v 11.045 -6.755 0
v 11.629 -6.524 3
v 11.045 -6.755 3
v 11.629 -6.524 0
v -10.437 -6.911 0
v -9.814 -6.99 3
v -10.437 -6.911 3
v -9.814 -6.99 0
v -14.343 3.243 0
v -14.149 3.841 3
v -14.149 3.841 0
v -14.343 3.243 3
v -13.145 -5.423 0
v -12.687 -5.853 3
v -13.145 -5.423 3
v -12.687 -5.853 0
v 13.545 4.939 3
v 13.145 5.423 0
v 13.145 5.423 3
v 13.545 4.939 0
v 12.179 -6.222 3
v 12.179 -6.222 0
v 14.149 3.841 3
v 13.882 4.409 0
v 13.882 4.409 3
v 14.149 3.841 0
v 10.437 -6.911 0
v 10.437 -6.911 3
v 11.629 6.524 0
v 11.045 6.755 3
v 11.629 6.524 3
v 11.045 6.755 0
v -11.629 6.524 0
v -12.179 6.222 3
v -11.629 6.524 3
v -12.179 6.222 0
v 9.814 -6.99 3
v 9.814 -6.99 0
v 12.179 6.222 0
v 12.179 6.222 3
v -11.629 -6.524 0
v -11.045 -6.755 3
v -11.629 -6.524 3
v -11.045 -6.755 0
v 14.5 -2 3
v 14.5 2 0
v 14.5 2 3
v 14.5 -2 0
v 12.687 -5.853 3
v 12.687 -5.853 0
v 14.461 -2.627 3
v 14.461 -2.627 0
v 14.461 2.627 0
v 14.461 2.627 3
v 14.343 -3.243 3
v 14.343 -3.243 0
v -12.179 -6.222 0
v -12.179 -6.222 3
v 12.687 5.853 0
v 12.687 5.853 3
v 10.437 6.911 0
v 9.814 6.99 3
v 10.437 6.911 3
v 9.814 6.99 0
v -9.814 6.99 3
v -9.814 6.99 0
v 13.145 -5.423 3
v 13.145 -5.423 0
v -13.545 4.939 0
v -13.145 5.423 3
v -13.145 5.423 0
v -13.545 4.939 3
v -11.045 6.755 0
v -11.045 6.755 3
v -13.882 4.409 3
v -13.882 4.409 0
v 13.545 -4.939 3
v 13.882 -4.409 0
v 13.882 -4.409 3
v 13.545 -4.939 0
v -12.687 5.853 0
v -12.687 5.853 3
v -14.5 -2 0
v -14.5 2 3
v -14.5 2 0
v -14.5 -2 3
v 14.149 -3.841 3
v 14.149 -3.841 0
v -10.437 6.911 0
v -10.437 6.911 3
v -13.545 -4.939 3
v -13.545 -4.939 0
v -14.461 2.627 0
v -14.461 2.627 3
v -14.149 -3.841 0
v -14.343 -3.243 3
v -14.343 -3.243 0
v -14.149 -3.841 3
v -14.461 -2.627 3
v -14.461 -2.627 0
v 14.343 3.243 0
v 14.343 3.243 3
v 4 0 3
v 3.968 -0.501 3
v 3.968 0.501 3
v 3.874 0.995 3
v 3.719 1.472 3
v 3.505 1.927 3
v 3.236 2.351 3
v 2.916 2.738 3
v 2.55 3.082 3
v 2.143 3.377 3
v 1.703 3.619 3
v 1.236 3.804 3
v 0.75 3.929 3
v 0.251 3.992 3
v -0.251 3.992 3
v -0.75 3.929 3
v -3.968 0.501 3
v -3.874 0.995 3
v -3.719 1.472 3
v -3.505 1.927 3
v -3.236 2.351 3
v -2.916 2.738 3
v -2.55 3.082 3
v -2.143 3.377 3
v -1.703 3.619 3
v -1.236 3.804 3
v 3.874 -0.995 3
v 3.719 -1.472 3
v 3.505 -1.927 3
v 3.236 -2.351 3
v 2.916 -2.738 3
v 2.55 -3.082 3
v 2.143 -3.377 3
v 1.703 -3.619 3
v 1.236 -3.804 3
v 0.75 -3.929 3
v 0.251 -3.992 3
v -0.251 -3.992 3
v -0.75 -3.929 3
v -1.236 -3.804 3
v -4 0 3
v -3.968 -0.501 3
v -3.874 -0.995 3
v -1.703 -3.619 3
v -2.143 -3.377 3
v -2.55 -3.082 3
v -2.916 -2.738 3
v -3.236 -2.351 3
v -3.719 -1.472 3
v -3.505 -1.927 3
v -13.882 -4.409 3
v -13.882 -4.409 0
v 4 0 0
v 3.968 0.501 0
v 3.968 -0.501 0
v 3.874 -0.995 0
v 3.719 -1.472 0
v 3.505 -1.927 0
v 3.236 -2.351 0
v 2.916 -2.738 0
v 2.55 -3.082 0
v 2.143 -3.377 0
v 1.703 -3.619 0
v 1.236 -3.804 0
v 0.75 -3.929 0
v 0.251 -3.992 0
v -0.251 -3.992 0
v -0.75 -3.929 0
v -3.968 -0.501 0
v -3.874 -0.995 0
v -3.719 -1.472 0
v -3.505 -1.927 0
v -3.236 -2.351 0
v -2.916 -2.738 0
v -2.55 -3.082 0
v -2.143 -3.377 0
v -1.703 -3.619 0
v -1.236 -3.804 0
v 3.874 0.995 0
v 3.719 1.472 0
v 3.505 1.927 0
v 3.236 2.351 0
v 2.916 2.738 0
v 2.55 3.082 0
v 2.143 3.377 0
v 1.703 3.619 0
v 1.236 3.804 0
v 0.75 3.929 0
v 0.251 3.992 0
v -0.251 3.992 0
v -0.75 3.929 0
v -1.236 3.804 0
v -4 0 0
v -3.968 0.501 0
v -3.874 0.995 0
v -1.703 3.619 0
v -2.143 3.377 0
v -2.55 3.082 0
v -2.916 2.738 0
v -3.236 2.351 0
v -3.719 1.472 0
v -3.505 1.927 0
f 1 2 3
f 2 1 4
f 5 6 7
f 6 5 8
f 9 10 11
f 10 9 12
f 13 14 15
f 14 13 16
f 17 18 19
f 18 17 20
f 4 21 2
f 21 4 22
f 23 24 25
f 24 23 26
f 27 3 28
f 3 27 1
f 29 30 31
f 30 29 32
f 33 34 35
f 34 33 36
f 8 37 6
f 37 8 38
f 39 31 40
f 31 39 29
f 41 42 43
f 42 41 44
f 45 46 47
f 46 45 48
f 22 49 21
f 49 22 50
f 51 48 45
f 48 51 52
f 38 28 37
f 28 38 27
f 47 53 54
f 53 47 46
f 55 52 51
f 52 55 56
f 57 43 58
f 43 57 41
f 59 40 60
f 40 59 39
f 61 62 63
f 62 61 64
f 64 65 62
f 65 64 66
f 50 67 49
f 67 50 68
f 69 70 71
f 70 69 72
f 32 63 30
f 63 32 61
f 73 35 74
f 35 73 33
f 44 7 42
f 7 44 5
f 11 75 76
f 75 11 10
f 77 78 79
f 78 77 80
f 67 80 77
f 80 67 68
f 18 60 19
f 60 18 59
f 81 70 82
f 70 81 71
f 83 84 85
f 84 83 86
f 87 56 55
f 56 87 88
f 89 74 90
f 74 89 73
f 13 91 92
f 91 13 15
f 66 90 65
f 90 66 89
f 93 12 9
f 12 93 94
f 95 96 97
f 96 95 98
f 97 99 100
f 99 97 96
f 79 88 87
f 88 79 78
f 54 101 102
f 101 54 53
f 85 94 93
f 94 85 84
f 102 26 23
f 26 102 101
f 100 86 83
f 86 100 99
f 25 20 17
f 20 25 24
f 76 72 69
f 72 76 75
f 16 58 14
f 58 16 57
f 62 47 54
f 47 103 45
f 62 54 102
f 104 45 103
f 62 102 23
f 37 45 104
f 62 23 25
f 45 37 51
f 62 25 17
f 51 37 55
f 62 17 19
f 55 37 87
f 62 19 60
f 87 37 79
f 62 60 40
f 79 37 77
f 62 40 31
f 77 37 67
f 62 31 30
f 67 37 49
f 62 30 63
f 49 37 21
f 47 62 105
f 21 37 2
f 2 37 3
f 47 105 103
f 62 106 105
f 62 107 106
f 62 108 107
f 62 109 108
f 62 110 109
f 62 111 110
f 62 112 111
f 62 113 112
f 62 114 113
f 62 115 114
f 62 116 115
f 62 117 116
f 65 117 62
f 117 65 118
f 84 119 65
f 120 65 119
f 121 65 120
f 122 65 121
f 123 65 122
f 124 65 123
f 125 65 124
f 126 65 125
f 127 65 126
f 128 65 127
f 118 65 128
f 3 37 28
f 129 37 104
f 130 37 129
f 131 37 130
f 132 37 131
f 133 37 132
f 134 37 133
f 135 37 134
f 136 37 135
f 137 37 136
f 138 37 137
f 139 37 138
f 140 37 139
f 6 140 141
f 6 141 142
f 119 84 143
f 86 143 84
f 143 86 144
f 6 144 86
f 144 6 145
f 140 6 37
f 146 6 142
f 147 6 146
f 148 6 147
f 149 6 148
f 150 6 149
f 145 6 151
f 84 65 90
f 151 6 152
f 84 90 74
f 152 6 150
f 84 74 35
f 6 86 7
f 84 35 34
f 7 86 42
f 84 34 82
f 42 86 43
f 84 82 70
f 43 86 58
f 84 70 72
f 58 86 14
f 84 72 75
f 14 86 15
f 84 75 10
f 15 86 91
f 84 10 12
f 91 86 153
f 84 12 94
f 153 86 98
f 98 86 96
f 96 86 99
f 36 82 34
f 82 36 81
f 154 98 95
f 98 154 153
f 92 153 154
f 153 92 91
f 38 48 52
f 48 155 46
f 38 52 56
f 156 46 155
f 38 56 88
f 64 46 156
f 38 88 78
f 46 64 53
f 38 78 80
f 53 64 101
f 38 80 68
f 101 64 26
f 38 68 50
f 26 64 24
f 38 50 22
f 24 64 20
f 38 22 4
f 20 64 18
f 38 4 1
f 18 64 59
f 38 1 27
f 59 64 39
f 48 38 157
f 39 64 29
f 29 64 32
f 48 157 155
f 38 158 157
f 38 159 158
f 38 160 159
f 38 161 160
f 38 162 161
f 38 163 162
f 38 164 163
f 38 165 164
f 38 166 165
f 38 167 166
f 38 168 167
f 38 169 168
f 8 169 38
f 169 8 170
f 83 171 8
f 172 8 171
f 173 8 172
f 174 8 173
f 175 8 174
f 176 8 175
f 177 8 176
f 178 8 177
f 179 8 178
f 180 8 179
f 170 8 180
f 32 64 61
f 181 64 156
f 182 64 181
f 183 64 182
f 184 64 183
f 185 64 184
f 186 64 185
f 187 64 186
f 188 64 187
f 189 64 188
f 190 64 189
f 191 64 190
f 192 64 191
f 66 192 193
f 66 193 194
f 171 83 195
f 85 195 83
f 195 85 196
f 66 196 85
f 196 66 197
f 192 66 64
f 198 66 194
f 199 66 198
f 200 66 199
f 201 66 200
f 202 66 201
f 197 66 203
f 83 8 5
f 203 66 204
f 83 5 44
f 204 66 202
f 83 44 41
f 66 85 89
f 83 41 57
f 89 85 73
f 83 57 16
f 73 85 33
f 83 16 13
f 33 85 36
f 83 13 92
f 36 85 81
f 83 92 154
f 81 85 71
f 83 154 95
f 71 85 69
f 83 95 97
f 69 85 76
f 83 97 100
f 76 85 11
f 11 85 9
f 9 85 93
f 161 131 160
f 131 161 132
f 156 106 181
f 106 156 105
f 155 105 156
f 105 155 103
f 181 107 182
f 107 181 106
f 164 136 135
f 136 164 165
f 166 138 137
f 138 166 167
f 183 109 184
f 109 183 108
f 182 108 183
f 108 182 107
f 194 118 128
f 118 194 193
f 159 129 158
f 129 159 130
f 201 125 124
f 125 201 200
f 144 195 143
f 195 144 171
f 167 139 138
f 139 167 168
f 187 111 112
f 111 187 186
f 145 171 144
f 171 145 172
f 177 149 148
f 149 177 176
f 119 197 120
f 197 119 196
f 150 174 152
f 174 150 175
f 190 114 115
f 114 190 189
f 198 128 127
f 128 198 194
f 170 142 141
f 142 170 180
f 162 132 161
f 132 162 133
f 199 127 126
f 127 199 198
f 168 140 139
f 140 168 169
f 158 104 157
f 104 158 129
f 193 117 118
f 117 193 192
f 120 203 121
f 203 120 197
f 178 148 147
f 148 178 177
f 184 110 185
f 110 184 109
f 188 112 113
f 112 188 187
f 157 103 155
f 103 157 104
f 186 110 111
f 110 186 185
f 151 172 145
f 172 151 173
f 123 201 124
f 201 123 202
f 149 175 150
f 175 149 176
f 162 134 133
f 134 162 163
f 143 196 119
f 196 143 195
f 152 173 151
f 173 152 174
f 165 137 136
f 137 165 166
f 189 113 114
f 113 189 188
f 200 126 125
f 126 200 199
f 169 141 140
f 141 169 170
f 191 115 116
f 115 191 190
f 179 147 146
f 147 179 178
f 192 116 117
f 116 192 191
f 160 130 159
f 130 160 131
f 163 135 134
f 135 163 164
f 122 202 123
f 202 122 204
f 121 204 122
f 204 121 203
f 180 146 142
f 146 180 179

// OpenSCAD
$fn = 50;

difference() {
	union() {
		hull() {
			translate(v = [-9.5, 2.0, 0]) {
				cylinder(h = 3, r = 5);
			}
			translate(v = [9.5, 2.0, 0]) {
				cylinder(h = 3, r = 5);
			}
			translate(v = [-9.5, -2.0, 0]) {
				cylinder(h = 3, r = 5);
			}
			translate(v = [9.5, -2.0, 0]) {
				cylinder(h = 3, r = 5);
			}
		}
	}
	union() {
		cylinder(h = 3, r = 4.0);
	}
}
